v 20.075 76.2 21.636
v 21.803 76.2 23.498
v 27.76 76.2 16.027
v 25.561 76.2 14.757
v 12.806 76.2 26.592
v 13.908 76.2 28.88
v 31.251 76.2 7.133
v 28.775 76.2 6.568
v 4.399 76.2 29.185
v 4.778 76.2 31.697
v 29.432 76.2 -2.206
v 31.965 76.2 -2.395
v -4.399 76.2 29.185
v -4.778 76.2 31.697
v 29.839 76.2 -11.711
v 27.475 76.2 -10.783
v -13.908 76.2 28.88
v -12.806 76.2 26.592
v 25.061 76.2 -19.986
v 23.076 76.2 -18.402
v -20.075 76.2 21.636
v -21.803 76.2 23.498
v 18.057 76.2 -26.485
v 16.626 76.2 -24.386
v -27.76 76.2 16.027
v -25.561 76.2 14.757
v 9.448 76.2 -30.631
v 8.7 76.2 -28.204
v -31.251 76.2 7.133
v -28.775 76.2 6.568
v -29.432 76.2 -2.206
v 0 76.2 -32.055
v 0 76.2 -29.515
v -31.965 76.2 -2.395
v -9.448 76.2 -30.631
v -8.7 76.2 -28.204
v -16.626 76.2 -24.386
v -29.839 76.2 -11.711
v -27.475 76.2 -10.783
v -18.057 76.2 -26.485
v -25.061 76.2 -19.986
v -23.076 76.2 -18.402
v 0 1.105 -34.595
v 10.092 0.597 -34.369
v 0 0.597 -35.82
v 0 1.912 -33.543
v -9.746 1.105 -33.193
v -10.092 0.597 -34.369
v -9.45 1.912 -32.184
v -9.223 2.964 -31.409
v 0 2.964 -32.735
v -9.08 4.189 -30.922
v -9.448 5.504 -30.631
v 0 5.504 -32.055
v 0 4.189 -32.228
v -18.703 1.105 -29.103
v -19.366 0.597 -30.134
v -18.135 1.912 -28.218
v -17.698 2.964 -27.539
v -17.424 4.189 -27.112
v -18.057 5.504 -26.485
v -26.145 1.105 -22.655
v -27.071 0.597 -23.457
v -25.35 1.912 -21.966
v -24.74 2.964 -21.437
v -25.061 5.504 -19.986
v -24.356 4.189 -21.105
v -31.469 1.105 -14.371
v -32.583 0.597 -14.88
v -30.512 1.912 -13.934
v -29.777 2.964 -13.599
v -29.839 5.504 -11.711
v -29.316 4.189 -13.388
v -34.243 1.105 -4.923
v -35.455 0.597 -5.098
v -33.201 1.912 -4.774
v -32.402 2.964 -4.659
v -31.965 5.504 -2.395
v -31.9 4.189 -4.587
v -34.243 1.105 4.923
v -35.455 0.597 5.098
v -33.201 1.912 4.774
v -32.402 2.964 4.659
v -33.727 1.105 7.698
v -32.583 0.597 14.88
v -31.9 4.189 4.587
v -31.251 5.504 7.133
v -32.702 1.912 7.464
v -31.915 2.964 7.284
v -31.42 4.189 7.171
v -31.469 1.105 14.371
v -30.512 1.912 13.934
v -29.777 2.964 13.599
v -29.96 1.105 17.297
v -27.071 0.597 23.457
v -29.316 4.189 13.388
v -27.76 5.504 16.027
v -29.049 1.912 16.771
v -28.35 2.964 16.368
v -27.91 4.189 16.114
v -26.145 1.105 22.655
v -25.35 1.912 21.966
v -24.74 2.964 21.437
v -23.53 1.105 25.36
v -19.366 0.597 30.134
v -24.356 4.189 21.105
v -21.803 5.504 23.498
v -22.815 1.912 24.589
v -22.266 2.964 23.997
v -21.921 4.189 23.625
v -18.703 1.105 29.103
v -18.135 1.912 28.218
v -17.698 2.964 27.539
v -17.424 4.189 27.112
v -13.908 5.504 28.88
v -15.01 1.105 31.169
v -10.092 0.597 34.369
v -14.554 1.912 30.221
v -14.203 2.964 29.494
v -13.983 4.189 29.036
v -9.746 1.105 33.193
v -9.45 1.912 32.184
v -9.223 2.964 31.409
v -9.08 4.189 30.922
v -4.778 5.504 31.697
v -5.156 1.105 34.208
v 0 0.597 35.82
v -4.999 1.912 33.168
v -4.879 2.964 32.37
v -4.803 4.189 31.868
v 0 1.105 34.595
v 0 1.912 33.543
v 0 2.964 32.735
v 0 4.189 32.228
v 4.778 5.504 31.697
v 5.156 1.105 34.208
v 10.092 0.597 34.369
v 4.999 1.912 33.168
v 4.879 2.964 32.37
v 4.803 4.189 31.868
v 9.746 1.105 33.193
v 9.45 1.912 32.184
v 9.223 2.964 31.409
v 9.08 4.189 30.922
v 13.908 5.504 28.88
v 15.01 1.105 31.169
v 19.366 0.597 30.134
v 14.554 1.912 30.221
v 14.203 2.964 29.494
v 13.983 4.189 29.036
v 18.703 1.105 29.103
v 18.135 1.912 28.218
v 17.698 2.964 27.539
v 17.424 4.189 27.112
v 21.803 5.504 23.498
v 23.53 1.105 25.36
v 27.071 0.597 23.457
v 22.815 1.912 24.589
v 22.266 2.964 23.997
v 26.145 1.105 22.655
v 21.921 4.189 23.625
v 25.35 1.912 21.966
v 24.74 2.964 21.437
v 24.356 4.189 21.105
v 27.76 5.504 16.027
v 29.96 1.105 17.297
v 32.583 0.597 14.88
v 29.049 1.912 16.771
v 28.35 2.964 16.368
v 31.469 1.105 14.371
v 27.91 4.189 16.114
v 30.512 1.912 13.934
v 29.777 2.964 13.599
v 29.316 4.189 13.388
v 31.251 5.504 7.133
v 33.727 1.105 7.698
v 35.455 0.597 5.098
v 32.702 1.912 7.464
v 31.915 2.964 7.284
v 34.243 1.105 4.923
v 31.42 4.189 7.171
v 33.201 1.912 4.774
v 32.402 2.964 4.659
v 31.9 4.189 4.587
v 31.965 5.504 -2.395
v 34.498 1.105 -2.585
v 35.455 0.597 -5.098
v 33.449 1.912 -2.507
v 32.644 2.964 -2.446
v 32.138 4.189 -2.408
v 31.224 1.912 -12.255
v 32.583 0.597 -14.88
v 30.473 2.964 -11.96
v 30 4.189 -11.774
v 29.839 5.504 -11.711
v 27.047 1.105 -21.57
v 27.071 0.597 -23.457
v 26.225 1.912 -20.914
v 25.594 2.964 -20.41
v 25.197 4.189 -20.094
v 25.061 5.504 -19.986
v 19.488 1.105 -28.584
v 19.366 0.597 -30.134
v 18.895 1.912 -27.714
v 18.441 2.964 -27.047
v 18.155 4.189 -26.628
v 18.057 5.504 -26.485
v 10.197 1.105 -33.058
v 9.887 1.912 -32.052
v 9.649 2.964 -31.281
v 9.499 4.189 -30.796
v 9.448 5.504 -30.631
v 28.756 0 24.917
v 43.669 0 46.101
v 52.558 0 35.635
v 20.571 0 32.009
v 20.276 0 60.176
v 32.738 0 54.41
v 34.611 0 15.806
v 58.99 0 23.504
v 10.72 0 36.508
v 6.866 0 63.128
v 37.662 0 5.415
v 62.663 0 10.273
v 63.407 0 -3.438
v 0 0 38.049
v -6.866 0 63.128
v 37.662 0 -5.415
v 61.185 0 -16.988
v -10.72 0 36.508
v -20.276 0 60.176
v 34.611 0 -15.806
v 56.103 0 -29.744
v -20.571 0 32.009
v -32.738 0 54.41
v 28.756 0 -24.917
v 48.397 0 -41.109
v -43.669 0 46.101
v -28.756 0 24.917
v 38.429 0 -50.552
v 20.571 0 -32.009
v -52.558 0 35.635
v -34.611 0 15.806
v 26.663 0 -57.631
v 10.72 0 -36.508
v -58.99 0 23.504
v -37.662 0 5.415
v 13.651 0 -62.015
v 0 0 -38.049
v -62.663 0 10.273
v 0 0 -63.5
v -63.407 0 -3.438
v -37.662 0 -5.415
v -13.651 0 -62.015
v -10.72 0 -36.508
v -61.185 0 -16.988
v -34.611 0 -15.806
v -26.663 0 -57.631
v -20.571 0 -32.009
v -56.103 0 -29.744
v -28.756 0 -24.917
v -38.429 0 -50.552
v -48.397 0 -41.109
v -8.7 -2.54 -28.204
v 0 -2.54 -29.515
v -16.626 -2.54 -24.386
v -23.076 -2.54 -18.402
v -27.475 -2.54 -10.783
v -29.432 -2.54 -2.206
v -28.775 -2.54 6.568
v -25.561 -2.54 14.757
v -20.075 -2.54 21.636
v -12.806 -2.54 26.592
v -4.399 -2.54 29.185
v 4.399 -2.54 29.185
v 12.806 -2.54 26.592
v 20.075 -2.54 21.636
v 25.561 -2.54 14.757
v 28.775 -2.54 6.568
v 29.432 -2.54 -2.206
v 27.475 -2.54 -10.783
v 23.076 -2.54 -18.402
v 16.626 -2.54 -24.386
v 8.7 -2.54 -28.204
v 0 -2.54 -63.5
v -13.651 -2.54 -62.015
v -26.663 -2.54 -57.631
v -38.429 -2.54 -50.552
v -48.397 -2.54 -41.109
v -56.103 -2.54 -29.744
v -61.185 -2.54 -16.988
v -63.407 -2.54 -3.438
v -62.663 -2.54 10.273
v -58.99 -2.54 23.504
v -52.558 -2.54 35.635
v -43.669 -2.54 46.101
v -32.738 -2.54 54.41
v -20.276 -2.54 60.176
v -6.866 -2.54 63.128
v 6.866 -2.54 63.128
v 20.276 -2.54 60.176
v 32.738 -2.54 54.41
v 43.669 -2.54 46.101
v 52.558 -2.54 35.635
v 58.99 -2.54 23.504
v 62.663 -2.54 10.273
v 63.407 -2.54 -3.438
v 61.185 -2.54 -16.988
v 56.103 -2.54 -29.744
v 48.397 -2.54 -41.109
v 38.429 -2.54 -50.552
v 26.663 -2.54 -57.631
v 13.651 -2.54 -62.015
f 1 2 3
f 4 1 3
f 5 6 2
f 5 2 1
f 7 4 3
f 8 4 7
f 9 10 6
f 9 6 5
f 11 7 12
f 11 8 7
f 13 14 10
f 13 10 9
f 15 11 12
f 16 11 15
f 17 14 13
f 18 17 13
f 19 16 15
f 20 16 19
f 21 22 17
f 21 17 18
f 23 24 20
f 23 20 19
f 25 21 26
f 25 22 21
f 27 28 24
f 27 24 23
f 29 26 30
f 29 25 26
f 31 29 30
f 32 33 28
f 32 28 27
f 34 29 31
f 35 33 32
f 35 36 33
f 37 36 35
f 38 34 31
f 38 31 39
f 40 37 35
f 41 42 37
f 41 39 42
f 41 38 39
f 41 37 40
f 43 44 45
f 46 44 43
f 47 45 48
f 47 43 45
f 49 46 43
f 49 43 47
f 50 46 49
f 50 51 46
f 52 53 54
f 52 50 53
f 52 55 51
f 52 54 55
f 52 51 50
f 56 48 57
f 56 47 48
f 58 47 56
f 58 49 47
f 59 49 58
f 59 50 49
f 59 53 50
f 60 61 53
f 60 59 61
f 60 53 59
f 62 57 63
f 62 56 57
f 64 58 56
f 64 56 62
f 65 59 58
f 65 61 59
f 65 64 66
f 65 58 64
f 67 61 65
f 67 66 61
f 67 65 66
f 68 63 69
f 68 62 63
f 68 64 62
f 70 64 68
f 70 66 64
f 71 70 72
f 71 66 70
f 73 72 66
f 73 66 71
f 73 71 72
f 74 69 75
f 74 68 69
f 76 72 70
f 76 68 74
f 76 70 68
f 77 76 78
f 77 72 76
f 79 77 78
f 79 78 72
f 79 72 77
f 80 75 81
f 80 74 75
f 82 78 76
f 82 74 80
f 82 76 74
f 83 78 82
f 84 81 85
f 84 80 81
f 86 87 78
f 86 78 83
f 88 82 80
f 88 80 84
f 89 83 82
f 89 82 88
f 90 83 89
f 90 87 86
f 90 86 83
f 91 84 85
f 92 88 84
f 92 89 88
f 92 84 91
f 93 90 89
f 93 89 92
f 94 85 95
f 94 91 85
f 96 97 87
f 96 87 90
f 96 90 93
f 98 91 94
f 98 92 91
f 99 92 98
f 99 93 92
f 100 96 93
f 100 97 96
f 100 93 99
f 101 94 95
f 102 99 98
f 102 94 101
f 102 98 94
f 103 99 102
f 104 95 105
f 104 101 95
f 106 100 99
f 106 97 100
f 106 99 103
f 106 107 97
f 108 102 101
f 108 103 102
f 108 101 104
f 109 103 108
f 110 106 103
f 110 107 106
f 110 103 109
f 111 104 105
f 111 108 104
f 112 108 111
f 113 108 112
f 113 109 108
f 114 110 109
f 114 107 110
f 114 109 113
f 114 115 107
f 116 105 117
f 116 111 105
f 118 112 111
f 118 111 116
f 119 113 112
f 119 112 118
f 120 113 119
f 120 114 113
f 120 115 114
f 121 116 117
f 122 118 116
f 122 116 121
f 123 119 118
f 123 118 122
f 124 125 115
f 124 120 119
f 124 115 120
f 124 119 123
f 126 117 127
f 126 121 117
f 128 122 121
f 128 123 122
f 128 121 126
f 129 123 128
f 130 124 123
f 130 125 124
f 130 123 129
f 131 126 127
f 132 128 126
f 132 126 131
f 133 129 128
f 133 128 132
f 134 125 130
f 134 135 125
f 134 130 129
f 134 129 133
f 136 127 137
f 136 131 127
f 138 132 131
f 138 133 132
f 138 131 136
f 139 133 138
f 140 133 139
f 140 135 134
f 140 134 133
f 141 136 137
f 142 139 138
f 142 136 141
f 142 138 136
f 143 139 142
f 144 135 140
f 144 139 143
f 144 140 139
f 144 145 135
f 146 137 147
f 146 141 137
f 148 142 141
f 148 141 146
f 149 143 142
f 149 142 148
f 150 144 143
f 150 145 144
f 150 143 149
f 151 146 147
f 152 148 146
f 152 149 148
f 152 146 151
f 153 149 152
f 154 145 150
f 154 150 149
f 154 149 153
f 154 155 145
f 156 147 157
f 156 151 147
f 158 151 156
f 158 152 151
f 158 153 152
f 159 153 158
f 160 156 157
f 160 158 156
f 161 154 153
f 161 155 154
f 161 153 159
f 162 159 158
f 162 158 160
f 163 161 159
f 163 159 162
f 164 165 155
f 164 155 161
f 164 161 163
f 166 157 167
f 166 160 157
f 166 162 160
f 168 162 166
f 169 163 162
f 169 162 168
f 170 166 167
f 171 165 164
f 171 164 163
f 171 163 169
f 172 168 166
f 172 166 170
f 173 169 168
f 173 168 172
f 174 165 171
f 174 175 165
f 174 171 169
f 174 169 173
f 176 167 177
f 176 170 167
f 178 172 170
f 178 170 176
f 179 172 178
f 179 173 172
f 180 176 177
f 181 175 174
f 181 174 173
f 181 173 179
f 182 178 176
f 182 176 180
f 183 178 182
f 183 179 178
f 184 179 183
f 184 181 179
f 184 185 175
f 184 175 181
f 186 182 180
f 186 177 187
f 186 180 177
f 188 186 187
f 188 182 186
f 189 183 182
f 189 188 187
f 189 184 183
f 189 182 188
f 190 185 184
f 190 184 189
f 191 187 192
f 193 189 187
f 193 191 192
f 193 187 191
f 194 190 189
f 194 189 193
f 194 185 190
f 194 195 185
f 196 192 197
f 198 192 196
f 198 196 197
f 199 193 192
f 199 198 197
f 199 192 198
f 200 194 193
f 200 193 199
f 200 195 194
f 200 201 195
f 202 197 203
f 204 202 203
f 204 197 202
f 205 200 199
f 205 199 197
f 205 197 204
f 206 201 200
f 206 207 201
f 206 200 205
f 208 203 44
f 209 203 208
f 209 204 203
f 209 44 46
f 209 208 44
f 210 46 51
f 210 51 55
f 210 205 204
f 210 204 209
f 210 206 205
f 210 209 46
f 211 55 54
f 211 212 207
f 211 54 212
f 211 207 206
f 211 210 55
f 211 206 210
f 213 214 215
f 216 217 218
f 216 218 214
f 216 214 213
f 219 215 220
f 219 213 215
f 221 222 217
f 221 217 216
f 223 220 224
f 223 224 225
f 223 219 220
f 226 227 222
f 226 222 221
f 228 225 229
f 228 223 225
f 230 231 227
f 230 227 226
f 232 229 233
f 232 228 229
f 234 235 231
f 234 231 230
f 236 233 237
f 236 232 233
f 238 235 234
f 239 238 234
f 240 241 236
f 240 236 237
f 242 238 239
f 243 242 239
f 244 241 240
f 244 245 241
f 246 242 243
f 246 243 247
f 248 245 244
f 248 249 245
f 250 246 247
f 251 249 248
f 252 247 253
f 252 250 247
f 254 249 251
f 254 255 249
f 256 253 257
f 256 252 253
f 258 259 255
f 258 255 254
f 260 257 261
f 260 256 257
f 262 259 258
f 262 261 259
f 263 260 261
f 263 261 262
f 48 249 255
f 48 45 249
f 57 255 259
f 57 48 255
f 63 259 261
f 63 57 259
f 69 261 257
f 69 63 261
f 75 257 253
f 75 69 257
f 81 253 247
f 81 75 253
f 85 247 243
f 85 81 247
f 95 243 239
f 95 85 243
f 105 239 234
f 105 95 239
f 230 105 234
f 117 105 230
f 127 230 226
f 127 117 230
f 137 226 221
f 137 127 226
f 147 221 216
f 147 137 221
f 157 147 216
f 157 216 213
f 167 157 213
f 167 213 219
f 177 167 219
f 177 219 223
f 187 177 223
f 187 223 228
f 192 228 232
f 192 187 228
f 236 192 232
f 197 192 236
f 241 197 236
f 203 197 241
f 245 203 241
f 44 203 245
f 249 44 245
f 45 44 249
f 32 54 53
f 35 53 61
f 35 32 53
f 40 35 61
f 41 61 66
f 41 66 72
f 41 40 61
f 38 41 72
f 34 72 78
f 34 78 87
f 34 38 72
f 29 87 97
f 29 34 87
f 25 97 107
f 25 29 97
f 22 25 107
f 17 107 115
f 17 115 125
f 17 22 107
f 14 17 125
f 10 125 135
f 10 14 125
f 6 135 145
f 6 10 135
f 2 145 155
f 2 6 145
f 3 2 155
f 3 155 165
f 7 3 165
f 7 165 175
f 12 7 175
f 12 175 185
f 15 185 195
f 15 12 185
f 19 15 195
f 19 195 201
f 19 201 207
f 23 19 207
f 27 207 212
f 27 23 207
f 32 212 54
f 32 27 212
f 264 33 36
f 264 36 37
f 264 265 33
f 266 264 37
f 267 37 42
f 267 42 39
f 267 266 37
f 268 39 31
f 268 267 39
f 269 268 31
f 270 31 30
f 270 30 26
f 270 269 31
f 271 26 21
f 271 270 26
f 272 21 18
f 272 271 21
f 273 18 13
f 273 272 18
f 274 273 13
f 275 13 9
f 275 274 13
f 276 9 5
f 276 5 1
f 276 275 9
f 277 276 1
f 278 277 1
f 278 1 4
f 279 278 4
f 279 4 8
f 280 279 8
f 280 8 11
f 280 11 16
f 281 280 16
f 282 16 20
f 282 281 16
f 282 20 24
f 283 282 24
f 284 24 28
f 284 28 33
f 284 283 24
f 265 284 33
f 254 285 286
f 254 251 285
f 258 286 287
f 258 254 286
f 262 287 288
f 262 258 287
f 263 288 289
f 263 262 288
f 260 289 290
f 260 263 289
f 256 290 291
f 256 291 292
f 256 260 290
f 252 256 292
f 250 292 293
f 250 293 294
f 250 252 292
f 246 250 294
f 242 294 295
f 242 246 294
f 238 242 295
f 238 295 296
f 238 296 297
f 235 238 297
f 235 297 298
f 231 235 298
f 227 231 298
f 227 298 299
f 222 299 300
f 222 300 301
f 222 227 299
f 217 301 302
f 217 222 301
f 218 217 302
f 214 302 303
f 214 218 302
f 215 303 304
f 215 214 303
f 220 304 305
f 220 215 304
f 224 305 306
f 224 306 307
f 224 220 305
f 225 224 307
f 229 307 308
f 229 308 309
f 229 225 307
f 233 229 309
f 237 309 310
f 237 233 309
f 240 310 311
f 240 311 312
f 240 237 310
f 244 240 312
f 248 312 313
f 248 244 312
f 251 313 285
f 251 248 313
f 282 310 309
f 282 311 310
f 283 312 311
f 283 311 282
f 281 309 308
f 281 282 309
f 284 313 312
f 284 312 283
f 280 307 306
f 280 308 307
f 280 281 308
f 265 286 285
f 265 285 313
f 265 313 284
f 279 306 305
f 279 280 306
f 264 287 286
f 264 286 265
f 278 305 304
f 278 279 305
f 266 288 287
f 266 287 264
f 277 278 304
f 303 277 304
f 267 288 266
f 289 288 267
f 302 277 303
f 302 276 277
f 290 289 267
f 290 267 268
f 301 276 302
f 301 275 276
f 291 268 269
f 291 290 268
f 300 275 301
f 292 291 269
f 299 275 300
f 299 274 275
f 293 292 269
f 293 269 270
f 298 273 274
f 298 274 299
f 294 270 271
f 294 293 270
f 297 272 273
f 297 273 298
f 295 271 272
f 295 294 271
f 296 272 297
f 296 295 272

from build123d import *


with BuildPart() as part:
    # Sketch1 → Revolve1 (revolve)
    with BuildSketch(Plane.XY, mode=Mode.PRIVATE) as revolve1_sk:
        with BuildLine():
            Line((38.0492, 0), (35.819999251, 0.59731254))
            ThreePointArc((35.819999251, 0.59731254), (33.104565031, 2.411707679), (32.0548, 5.504215738))
            Line((32.0548, 5.504215738), (32.0548, 76.2))
            Line((32.0548, 76.2), (29.5148, 76.2))
            Line((29.5148, 76.2), (29.5148, -2.54))
            Line((29.5148, -2.54), (63.5, -2.54))
            Line((63.5, -2.54), (63.5, 0))
            Line((63.5, 0), (38.0492, 0))
        make_face()
    revolve(revolve1_sk.sketch.rotate(Axis((0, 0, 0), (0, 1, 0)), 90), axis=Axis((0, 0, 0), (0, 1, 0)))


solid = part.part
